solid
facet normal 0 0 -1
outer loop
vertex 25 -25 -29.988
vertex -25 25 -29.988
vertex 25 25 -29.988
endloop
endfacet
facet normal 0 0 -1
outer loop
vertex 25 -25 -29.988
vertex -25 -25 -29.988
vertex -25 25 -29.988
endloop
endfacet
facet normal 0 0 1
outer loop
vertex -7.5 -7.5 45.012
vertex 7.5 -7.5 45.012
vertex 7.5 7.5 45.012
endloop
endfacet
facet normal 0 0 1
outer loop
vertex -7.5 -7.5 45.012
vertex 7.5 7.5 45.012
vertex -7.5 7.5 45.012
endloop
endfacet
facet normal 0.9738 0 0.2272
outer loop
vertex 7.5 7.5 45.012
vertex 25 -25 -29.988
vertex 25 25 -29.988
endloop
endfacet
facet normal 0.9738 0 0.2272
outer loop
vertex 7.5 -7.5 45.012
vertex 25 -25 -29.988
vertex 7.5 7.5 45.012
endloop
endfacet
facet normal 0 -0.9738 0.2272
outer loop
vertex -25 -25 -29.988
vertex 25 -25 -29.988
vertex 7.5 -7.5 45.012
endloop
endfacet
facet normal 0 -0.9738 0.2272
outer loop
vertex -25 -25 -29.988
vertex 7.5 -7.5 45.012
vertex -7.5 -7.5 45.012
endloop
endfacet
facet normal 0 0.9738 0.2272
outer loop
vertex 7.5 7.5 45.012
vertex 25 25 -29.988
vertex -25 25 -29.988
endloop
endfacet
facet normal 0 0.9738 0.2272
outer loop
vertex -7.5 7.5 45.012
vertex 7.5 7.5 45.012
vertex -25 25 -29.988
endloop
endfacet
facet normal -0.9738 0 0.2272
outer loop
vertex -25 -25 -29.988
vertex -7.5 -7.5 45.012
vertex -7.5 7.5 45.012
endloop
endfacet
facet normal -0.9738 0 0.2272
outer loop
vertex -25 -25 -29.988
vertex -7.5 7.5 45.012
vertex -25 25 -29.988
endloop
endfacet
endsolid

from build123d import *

# Parameters (mm, degrees)
F1_DEPTH = 25
F2_SIZE2 = 74.99999
F2_SIZE  = 17.49999


# Not quite as in the source:
# - a fillet or chamfer is up to 0.001 mm smaller than in the source, because OpenCascade refuses the exact size


with BuildPart() as f1:
    # F0 (on Front) → F1 (new body, symmetric)
    with BuildSketch(Plane.XZ):
        Polygon((25, -29.9881670944), (7.5, 45.0118329056), (-7.5, 45.0118329056), (-25, -29.9881670944), align=None)
    extrude(amount=F1_DEPTH, both=True)

    # F2 (size 17.5 and 75 in the source; OpenCascade refuses exactly that, so slightly less here)
    f2_edges = [f1.edges().sort_by_distance(p)[0] for p in [
        (0, 25, 45.011833),
        (0, -25, 45.011833),
    ]]
    f2_side = f1.faces().sort_by_distance((0, 0, 45.011833))[0]
    chamfer(f2_edges, length=F2_SIZE, length2=F2_SIZE2, reference=f2_side)


solid = f1.part
